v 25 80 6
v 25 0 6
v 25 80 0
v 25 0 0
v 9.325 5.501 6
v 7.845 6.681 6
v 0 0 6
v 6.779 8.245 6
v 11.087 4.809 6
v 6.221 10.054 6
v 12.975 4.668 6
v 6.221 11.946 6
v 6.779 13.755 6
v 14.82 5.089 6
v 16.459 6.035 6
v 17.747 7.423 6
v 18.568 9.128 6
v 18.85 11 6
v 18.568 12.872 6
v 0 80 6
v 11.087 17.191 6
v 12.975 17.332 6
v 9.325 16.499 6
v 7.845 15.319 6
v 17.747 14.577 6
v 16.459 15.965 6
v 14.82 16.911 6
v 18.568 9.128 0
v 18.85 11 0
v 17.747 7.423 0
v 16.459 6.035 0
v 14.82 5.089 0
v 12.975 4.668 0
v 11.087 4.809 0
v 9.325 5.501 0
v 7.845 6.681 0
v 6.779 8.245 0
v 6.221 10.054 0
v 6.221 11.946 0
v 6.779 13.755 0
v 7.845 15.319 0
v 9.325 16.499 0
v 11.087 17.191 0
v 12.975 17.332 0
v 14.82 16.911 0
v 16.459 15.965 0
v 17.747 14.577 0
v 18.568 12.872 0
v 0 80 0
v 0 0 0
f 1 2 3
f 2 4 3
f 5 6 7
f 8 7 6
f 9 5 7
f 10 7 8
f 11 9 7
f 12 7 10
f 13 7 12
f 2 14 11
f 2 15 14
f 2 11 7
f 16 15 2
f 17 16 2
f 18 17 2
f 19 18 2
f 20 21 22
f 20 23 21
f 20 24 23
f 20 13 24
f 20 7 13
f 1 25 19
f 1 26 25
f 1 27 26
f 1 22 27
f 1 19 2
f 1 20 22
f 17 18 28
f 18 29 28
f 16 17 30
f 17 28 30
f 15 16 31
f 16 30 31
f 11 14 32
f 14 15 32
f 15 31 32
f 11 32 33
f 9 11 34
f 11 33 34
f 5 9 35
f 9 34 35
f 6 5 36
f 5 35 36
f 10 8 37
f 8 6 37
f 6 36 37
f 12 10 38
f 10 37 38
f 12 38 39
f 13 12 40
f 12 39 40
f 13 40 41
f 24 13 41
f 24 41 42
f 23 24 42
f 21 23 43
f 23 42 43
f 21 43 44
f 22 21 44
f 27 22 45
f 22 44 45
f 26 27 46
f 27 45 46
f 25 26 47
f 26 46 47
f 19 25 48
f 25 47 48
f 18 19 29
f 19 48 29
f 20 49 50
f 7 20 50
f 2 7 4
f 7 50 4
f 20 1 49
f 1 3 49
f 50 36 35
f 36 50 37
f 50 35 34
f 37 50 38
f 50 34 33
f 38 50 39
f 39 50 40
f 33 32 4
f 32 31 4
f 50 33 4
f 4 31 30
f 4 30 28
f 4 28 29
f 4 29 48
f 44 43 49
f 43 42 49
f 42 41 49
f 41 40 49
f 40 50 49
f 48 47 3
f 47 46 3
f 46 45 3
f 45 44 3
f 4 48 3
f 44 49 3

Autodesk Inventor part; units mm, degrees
ref_plane "YZ Plane" through (0, 0, 0) normal (1, 0, 0) x (0, 1, 0)
ref_plane "XZ Plane" through (0, 0, 0) normal (0, 1, 0) x (-1, 0, 0)
ref_plane "XY Plane" through (0, 0, 0) normal (0, 0, 1) x (1, 0, 0)
sketch "Sketch1" plane through (0, 0, 0) normal (0, 0, 1) x (1, 0, 0)
  line L0 (0, 0) -> (25, 0)
  line L1 (25, 0) -> (25, 80)
  line L2 (25, 80) -> (0, 80)
  line L3 (0, 80) -> (0, 0)
  circle A0 centre (12.5, 11) radius 6.35
  dimension "d0" = 25
  dimension "d1" = 80
  dimension "d2" = 12.7
extrude "Extrusion1" add sketch "Sketch1" along normal blind 6
properties part number "Handle Connected"
